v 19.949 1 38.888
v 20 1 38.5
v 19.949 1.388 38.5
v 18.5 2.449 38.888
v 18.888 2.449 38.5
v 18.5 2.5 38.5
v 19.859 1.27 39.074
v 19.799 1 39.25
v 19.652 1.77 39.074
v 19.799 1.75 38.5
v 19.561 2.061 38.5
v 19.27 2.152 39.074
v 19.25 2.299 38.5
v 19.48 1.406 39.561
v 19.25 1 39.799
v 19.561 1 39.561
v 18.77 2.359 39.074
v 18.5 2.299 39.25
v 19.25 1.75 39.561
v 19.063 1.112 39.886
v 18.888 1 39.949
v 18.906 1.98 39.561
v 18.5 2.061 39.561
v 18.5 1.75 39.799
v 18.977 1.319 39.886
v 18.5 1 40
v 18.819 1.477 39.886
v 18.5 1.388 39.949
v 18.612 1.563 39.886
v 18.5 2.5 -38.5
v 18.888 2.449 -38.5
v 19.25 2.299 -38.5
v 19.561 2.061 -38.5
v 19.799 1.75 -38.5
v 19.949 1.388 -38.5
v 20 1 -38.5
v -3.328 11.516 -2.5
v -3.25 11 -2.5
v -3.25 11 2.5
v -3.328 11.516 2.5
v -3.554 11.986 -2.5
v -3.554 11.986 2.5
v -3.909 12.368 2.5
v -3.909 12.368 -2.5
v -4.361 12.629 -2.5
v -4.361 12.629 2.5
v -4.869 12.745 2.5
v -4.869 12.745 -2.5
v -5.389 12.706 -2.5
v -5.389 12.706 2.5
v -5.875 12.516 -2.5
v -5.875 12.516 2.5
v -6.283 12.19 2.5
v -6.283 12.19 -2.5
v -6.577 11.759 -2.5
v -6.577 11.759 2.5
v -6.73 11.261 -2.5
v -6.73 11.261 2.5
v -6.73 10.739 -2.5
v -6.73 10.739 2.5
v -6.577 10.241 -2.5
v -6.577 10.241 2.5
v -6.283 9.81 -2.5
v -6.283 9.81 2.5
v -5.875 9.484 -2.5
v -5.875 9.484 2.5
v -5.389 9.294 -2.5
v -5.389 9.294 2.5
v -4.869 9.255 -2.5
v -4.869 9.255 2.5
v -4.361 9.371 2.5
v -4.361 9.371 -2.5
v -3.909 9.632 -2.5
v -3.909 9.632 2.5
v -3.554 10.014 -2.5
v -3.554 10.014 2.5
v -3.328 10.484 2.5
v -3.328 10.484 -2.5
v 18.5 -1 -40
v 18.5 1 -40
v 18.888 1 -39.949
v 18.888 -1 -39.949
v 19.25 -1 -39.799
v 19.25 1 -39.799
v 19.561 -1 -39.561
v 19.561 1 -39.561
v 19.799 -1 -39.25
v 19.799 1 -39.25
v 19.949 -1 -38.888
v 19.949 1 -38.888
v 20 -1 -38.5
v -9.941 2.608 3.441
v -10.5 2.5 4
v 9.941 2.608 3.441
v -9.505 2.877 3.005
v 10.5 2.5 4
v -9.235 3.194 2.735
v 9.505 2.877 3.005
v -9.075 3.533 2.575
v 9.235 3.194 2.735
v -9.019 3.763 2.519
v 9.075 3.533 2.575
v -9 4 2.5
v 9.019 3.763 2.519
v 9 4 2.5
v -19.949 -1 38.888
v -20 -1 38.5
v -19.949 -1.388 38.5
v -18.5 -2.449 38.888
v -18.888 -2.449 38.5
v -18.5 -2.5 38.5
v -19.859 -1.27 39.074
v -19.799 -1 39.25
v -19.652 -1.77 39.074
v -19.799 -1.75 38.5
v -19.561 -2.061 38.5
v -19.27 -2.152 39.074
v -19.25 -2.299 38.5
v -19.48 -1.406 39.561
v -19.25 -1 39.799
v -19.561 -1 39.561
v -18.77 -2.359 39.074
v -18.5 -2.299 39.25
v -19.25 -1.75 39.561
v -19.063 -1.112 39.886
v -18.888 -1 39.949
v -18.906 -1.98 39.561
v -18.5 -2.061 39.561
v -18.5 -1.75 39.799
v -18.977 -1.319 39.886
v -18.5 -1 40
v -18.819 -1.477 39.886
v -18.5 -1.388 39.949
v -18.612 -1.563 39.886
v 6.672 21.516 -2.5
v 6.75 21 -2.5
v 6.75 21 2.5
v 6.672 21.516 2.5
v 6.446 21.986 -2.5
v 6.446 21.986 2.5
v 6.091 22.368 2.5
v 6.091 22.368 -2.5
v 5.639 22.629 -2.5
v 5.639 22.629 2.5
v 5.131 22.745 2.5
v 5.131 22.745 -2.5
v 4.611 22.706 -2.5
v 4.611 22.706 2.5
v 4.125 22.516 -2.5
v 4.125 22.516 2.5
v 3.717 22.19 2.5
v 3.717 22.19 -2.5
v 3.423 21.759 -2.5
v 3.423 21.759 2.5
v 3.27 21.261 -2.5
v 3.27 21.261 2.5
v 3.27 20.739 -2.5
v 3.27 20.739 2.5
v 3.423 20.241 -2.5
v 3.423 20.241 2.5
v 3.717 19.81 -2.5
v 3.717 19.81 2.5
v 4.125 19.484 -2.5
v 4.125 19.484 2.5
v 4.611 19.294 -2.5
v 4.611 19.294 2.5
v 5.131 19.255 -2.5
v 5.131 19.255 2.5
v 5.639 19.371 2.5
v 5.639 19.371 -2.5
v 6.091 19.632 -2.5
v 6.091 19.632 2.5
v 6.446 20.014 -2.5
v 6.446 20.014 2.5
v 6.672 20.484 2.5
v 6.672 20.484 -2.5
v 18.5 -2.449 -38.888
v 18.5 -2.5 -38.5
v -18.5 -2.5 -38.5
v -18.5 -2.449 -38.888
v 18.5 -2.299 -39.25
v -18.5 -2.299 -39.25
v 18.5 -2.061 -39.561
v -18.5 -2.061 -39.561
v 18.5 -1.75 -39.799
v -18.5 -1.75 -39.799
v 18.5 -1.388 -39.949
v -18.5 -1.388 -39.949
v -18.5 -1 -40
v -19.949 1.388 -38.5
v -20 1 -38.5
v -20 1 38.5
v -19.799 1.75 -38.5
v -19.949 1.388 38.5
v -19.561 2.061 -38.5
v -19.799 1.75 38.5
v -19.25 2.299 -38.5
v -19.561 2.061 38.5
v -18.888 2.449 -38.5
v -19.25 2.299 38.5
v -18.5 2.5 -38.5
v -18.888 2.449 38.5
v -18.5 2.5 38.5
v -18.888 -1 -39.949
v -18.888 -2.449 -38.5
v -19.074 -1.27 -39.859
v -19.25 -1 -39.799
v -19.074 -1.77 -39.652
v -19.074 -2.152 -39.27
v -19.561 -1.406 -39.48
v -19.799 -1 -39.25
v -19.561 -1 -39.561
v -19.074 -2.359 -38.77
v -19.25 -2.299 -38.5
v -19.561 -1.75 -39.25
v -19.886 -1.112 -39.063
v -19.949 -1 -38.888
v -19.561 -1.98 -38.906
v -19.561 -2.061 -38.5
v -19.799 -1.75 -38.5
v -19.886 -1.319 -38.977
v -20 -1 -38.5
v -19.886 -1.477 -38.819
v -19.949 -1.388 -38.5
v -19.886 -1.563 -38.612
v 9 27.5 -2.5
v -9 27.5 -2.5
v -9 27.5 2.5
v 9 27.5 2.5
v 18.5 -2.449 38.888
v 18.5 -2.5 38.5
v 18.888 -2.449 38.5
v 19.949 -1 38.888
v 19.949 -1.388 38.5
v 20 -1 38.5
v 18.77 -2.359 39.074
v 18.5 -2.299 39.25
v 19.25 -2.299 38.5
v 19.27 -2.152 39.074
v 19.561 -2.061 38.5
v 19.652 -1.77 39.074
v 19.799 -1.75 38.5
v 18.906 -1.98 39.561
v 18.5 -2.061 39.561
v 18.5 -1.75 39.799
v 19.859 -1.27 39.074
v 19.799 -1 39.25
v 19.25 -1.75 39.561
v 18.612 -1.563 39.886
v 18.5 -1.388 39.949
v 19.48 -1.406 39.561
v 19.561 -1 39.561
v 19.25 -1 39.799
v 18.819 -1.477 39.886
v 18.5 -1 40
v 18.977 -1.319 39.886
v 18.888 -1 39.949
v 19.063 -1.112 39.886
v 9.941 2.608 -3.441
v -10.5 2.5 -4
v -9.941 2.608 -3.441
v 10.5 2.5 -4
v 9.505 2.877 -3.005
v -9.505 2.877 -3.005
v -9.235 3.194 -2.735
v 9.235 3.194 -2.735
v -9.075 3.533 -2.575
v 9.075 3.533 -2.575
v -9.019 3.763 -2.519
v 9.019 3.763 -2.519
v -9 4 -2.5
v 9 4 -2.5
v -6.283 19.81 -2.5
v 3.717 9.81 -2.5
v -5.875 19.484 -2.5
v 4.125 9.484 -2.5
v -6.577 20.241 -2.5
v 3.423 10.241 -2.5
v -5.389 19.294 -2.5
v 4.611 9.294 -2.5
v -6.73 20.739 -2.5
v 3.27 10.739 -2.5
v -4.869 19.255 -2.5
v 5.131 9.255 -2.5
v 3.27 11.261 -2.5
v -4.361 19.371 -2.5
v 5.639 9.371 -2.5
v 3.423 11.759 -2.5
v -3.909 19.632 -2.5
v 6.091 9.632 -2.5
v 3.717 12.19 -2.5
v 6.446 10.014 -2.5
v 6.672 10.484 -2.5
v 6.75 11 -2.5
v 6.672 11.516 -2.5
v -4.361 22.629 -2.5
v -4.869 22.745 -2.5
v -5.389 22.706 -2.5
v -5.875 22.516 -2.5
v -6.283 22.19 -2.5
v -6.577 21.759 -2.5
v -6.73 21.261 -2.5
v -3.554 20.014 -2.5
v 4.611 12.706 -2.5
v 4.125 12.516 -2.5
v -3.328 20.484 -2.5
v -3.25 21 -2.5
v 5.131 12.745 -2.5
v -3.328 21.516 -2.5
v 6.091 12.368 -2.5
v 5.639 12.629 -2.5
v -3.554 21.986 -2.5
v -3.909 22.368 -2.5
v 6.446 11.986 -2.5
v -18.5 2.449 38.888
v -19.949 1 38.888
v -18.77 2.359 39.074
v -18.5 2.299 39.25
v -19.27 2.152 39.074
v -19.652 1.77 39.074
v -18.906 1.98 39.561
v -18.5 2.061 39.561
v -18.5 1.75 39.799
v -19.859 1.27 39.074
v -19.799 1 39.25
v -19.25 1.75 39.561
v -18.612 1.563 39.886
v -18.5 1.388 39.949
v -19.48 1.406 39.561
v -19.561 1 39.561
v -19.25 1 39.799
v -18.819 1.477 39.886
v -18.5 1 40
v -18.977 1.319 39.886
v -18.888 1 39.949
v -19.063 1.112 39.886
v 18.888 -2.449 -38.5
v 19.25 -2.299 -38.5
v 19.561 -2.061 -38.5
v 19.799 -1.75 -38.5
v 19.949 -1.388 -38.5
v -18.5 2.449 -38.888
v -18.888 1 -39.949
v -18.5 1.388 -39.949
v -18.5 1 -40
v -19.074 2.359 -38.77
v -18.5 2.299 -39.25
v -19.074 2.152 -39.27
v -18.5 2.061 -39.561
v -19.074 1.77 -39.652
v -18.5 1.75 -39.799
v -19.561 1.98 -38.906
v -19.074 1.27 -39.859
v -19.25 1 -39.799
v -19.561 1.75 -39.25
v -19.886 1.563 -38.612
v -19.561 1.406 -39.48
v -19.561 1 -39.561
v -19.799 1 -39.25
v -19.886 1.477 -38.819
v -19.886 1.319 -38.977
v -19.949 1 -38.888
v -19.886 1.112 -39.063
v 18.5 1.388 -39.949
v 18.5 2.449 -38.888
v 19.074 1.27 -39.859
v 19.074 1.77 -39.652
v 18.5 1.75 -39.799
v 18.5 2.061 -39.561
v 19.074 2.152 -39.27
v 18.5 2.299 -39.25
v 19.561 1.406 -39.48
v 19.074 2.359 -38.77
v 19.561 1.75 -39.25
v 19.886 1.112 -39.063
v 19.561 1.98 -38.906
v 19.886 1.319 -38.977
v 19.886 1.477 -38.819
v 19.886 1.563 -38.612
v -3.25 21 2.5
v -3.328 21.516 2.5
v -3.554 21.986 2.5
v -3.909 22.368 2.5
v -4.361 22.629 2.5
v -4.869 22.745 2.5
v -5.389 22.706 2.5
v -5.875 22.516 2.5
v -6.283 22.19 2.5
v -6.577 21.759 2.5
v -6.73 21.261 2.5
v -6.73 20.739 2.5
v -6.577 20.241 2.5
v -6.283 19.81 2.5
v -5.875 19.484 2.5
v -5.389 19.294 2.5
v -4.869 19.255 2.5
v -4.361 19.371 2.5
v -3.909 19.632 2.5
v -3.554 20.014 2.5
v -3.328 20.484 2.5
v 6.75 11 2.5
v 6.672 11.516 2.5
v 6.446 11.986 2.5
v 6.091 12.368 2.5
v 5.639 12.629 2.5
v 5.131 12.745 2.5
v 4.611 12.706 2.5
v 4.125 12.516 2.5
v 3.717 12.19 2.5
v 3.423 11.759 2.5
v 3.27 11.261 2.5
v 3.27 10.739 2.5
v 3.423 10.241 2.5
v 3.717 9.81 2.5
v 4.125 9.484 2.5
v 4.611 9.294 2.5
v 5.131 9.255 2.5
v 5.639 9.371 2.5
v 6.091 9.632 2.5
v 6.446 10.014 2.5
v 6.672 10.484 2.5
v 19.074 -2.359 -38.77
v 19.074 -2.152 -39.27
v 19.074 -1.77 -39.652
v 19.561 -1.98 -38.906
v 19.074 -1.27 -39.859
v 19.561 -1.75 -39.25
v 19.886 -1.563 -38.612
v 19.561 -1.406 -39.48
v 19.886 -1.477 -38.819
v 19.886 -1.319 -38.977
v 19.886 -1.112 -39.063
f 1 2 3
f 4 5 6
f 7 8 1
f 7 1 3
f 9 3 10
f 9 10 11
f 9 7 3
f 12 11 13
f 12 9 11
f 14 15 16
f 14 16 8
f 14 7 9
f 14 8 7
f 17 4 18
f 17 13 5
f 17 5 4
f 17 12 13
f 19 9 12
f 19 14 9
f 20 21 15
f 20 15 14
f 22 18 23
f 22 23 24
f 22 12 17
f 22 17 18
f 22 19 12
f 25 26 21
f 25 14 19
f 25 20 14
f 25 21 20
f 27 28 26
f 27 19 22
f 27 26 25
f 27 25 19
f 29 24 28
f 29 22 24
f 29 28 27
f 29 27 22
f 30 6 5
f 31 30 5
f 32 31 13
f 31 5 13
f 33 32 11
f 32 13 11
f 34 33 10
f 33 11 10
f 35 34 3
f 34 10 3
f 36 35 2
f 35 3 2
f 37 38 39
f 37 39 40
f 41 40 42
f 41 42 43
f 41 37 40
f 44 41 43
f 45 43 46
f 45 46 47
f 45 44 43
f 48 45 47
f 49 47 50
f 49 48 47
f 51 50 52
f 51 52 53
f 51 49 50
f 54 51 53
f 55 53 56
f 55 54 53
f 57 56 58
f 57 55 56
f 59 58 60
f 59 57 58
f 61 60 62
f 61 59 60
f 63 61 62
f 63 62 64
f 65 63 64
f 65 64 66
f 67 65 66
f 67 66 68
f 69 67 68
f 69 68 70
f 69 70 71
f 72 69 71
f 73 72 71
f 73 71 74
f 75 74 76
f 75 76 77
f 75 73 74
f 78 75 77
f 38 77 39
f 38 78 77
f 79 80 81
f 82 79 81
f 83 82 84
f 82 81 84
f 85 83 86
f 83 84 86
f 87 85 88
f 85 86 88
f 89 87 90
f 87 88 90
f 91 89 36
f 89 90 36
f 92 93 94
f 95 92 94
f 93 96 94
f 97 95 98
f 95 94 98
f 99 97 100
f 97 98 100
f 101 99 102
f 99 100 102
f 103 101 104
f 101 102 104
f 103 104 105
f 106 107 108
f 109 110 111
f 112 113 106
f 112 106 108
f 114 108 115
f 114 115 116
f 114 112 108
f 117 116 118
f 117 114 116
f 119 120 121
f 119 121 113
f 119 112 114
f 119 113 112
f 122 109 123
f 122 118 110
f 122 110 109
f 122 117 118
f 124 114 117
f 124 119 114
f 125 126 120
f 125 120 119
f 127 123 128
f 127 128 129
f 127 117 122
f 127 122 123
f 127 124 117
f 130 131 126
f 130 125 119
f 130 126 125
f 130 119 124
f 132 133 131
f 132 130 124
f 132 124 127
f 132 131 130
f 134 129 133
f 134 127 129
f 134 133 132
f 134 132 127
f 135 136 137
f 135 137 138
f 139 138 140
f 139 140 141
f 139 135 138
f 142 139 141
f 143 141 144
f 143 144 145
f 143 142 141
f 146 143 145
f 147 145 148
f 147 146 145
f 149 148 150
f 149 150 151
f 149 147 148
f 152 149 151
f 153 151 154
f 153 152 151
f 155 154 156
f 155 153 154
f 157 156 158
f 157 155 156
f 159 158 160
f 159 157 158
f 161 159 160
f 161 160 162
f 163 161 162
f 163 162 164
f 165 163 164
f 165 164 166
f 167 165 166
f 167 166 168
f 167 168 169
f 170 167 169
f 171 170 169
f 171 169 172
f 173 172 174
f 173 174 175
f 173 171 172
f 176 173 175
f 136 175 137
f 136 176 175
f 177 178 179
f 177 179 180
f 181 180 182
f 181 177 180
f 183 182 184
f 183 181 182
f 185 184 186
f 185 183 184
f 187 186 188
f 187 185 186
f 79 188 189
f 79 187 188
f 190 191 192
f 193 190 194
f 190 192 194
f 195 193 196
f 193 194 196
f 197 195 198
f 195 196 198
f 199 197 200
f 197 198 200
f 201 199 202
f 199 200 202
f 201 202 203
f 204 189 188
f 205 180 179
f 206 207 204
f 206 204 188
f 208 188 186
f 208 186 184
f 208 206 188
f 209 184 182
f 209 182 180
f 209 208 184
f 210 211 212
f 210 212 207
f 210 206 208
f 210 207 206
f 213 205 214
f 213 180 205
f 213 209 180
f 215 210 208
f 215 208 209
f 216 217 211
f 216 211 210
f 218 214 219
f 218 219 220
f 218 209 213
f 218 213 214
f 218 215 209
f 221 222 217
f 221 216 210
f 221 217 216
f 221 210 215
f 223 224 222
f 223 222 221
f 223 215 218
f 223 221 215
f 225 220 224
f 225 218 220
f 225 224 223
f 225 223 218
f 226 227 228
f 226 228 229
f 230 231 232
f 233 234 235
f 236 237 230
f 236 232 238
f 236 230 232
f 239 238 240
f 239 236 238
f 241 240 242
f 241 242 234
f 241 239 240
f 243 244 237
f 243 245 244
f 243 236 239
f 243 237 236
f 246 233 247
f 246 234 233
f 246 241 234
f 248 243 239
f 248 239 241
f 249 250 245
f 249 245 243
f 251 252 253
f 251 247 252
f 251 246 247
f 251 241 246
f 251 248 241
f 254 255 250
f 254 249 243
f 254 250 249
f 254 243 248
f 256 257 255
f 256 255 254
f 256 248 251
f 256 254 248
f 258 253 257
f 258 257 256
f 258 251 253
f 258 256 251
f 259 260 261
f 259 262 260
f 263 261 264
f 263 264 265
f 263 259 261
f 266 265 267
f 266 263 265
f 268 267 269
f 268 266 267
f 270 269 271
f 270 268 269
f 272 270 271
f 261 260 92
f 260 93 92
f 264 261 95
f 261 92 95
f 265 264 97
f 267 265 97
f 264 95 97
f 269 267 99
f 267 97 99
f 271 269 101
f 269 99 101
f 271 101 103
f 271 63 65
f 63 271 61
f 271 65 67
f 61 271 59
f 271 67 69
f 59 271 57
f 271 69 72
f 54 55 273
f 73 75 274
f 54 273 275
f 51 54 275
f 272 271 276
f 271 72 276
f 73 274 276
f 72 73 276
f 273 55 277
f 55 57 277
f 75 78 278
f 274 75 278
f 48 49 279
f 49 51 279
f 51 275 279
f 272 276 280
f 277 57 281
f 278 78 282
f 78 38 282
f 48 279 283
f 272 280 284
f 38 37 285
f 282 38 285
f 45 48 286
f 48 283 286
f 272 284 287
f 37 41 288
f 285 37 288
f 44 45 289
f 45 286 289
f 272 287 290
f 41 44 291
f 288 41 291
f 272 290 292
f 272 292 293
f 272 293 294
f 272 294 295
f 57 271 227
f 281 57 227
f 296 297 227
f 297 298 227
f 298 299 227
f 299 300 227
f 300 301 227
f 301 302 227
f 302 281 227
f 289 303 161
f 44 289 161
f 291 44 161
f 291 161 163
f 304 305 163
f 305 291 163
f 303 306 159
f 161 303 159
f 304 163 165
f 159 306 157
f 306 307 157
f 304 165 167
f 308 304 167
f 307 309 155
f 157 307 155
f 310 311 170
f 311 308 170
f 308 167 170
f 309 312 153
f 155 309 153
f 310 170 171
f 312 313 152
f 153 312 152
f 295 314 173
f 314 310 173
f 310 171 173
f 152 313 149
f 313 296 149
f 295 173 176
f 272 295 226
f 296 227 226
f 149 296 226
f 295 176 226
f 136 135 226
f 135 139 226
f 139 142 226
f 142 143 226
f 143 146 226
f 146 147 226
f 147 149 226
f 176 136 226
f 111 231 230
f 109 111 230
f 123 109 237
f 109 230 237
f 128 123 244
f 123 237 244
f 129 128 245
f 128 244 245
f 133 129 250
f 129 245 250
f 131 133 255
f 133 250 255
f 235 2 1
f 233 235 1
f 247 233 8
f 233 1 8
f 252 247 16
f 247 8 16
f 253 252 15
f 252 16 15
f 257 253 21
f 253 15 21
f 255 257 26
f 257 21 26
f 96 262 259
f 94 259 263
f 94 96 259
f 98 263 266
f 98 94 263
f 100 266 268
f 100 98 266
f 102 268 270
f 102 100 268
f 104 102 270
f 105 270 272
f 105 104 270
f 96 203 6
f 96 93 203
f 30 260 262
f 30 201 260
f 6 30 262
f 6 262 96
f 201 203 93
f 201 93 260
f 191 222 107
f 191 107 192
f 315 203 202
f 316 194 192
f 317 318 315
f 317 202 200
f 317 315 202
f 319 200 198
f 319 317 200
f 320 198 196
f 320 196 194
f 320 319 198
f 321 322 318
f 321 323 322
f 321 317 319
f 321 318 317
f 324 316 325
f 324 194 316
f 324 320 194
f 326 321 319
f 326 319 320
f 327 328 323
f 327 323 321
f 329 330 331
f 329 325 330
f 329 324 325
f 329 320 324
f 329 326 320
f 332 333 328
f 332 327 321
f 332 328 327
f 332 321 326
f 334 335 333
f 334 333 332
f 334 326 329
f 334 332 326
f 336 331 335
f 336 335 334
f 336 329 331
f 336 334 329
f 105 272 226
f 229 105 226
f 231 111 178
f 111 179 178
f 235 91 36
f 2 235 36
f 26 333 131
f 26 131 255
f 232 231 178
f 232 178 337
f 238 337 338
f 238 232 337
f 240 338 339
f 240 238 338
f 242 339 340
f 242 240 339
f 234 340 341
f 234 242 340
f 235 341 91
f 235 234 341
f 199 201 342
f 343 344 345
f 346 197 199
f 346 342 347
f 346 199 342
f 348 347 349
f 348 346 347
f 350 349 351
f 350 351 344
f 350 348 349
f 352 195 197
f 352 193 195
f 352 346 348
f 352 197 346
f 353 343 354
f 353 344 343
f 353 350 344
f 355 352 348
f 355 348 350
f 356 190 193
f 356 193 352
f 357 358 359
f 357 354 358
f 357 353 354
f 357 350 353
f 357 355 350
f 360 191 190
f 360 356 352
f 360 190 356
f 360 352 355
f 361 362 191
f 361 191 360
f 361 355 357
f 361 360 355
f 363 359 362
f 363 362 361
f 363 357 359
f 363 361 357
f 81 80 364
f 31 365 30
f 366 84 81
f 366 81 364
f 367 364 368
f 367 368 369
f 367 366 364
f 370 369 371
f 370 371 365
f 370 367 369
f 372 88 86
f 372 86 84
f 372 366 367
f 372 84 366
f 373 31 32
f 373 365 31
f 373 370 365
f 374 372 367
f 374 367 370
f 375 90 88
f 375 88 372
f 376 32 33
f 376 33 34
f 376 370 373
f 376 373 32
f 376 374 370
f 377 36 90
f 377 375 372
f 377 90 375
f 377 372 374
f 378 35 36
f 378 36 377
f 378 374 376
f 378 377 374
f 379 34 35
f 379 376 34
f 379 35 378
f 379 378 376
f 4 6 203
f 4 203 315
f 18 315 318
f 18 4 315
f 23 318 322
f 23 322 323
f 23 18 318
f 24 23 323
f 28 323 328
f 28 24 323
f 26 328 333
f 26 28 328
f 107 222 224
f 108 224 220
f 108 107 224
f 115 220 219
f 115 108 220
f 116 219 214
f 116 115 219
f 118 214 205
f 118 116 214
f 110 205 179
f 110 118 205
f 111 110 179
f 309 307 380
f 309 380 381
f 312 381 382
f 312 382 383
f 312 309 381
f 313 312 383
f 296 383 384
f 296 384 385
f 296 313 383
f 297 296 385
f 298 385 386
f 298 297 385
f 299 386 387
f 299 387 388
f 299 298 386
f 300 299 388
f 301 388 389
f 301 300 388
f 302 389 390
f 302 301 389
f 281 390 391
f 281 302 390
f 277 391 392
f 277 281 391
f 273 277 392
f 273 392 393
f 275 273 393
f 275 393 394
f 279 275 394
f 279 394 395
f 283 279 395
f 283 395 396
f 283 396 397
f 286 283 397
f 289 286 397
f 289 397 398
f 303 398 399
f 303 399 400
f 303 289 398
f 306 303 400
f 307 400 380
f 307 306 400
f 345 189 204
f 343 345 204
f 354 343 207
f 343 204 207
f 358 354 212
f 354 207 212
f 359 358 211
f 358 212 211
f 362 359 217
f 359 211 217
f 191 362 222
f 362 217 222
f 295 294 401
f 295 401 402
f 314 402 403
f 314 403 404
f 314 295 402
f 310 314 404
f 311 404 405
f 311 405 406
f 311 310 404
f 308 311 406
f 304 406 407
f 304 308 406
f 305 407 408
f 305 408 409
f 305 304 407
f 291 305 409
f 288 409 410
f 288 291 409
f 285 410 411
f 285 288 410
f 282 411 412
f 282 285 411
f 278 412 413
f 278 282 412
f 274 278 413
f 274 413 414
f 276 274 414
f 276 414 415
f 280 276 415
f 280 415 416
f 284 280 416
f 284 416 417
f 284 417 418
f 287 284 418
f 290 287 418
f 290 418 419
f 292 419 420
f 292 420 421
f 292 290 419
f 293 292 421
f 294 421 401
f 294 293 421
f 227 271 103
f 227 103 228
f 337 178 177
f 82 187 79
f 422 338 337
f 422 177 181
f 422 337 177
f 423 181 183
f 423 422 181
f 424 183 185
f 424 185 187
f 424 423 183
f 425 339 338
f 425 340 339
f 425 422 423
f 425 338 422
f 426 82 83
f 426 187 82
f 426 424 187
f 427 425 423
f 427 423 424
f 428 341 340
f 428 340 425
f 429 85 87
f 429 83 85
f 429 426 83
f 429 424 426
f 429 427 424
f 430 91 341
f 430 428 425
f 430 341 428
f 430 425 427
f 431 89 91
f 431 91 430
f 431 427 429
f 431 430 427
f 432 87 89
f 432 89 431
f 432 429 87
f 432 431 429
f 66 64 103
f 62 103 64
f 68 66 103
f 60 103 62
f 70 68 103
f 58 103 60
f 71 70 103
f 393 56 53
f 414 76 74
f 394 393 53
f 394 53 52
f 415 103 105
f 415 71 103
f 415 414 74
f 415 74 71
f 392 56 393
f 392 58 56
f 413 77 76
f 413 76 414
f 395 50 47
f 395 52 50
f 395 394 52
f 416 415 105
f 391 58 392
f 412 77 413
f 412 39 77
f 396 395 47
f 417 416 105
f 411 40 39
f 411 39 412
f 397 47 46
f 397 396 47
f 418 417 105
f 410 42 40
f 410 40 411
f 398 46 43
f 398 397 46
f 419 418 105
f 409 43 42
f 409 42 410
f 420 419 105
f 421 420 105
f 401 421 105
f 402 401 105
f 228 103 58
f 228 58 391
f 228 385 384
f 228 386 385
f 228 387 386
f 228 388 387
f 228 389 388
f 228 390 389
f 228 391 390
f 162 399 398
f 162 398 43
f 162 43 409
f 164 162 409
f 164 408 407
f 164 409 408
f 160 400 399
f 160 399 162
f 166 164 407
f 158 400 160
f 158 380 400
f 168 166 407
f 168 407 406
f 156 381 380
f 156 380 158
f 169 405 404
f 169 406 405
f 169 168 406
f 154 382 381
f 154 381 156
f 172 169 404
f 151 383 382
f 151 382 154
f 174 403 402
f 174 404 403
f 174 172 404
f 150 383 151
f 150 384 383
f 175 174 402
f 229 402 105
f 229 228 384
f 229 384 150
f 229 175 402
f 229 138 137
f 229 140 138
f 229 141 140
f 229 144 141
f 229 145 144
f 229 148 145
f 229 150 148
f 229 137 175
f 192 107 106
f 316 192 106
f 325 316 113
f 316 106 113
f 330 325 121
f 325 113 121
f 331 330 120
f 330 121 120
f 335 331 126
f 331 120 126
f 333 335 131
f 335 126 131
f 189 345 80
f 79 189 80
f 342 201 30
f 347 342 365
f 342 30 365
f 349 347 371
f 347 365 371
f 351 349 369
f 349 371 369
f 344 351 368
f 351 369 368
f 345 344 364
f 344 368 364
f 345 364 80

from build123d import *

# Parameters (mm, degrees)
BOSS_EXTRUDE1_DEPTH      = 40
BOSS_EXTRUDE1_DEPTH_BACK = 40
SKETCH1_W                = 40
SKETCH1_H                = 5
BOSS_EXTRUDE2_DEPTH      = 2.5
BOSS_EXTRUDE2_DEPTH_BACK = 2.5
SKETCH2_W                = 18
SKETCH2_H                = 25
SKETCH2_R                = 1.75
FILLET1_R                = 1.5
FILLET2_R                = 1.5
FILLET3_R                = 1.5


with BuildPart() as part:
    # Sketch1 → Boss-Extrude1 (new, two sides: drawn at the far end of the back side and taken through both)
    with BuildSketch(Plane.XY.offset(-BOSS_EXTRUDE1_DEPTH_BACK)):
        Rectangle(SKETCH1_W, SKETCH1_H)
    extrude(amount=BOSS_EXTRUDE1_DEPTH + BOSS_EXTRUDE1_DEPTH_BACK)

    # Sketch2 → Boss-Extrude2 (add, two sides: drawn at the far end of the back side and taken through both)
    with BuildSketch(Plane.XY.offset(-BOSS_EXTRUDE2_DEPTH_BACK)):
        with Locations((0, 15)):
            Rectangle(SKETCH2_W, SKETCH2_H)
        with Locations((-5, 11)):
            Circle(SKETCH2_R, mode=Mode.SUBTRACT)
        with Locations((5, 11)):
            Circle(SKETCH2_R, mode=Mode.SUBTRACT)
        with Locations((5, 21)):
            Circle(SKETCH2_R, mode=Mode.SUBTRACT)
        with Locations((-5, 21)):
            Circle(SKETCH2_R, mode=Mode.SUBTRACT)
    extrude(amount=BOSS_EXTRUDE2_DEPTH + BOSS_EXTRUDE2_DEPTH_BACK)

    # Fillet1
    fillet1_edges = [part.edges().sort_by_distance(p)[0] for p in [
        (0, 2.5, 40),
        (0, -2.5, 40),
        (0, -2.5, -40),
        (9, 2.5, 0),
        (0, 2.5, -2.5),
        (-9, 2.5, 0),
        (0, 2.5, 2.5),
        (20, -2.5, 0),
        (-20, -2.5, 0),
        (-20, 2.5, 0),
        (20, 2.5, 0),
        (0, 2.5, -40),
    ]]
    fillet(fillet1_edges, radius=FILLET1_R)

    # Fillet2
    # the kernel refuses this fillet: 1.5 mm, written as the material it takes off along each edge
    with BuildSketch(Plane(origin=(18.5, 1, 38.5), x_dir=(1, 0, 0), z_dir=(0, 0, 1))) as fillet2_piece_1_section:
        Polygon((0, 0), (FILLET2_R, 0), (FILLET2_R, FILLET2_R), (0, FILLET2_R), align=None)
    fillet2_piece_1 = extrude(amount=FILLET2_R, mode=Mode.PRIVATE)
    fillet2_piece_1 = fillet2_piece_1 - Plane(origin=(18.5, 1, 38.5), x_dir=(-0.7071067811865475, -0.7071067811865475, 0), z_dir=(0, 0, 1)) * Sphere(FILLET2_R, mode=Mode.PRIVATE)
    add(fillet2_piece_1, mode=Mode.SUBTRACT)
    with BuildSketch(Plane(origin=(-18.5, 1, 38.5), x_dir=(-1, 0, 0), z_dir=(0, 0, 1))) as fillet2_piece_2_section:
        Polygon((0, 0), (FILLET2_R, 0), (FILLET2_R, -FILLET2_R), (0, -FILLET2_R), align=None)
    fillet2_piece_2 = extrude(amount=FILLET2_R, mode=Mode.PRIVATE)
    fillet2_piece_2 = fillet2_piece_2 - Plane(origin=(-18.5, 1, 38.5), x_dir=(0.7071067811865475, -0.7071067811865475, 0), z_dir=(0, 0, 1)) * Sphere(FILLET2_R, mode=Mode.PRIVATE)
    add(fillet2_piece_2, mode=Mode.SUBTRACT)
    with BuildSketch(Plane(origin=(-18.5, -1, 38.5), x_dir=(-1, 0, 0), z_dir=(0, 0, 1))) as fillet2_piece_3_section:
        Polygon((0, 0), (FILLET2_R, 0), (FILLET2_R, FILLET2_R), (0, FILLET2_R), align=None)
    fillet2_piece_3 = extrude(amount=FILLET2_R, mode=Mode.PRIVATE)
    fillet2_piece_3 = fillet2_piece_3 - Plane(origin=(-18.5, -1, 38.5), x_dir=(0.7071067811865475, 0.7071067811865475, 0), z_dir=(0, 0, 1)) * Sphere(FILLET2_R, mode=Mode.PRIVATE)
    add(fillet2_piece_3, mode=Mode.SUBTRACT)
    with BuildSketch(Plane(origin=(18.5, -1, 38.5), x_dir=(1, 0, 0), z_dir=(0, 0, 1))) as fillet2_piece_4_section:
        Polygon((0, 0), (FILLET2_R, 0), (FILLET2_R, -FILLET2_R), (0, -FILLET2_R), align=None)
    fillet2_piece_4 = extrude(amount=FILLET2_R, mode=Mode.PRIVATE)
    fillet2_piece_4 = fillet2_piece_4 - Plane(origin=(18.5, -1, 38.5), x_dir=(-0.7071067811865475, 0.7071067811865475, 0), z_dir=(0, 0, 1)) * Sphere(FILLET2_R, mode=Mode.PRIVATE)
    add(fillet2_piece_4, mode=Mode.SUBTRACT)
    with BuildSketch(Plane(origin=(20, 1, 40), x_dir=(-1, 0, 0), z_dir=(0, -1, 0)), Plane(origin=(-20, -1, 40), x_dir=(1, 0, 0), z_dir=(0, 1, 0))) as fillet2_piece_5:
        with BuildLine():
            CenterArc((FILLET2_R, FILLET2_R), FILLET2_R, 180, 90)
            Line((0, FILLET2_R), (0, 0))
            Line((0, 0), (FILLET2_R, 0))
        make_face()
    extrude(amount=2, mode=Mode.SUBTRACT)

    # Fillet3
    # the kernel refuses this fillet: 1.5 mm, written as the material it takes off along each edge
    with BuildSketch(Plane(origin=(18.5, 1, -38.5), x_dir=(0, 0, -1), z_dir=(1, 0, 0))) as fillet3_piece_1_section:
        Polygon((0, 0), (FILLET3_R, 0), (FILLET3_R, FILLET3_R), (0, FILLET3_R), align=None)
    fillet3_piece_1 = extrude(amount=FILLET3_R, mode=Mode.PRIVATE)
    fillet3_piece_1 = fillet3_piece_1 - Plane(origin=(18.5, 1, -38.5), x_dir=(0, -0.7071067811865475, 0.7071067811865475), z_dir=(1, 0, 0)) * Sphere(FILLET3_R, mode=Mode.PRIVATE)
    add(fillet3_piece_1, mode=Mode.SUBTRACT)
    with BuildSketch(Plane(origin=(-18.5, 1, -38.5), x_dir=(0, 0, -1), z_dir=(-1, 0, 0))) as fillet3_piece_2_section:
        Polygon((0, 0), (FILLET3_R, 0), (FILLET3_R, -FILLET3_R), (0, -FILLET3_R), align=None)
    fillet3_piece_2 = extrude(amount=FILLET3_R, mode=Mode.PRIVATE)
    fillet3_piece_2 = fillet3_piece_2 - Plane(origin=(-18.5, 1, -38.5), x_dir=(0, -0.7071067811865475, 0.7071067811865475), z_dir=(-1, 0, 0)) * Sphere(FILLET3_R, mode=Mode.PRIVATE)
    add(fillet3_piece_2, mode=Mode.SUBTRACT)
    with BuildSketch(Plane(origin=(-18.5, -1, -38.5), x_dir=(0, 0, -1), z_dir=(-1, 0, 0))) as fillet3_piece_3_section:
        Polygon((0, 0), (FILLET3_R, 0), (FILLET3_R, FILLET3_R), (0, FILLET3_R), align=None)
    fillet3_piece_3 = extrude(amount=FILLET3_R, mode=Mode.PRIVATE)
    fillet3_piece_3 = fillet3_piece_3 - Plane(origin=(-18.5, -1, -38.5), x_dir=(0, 0.7071067811865475, 0.7071067811865475), z_dir=(-1, 0, 0)) * Sphere(FILLET3_R, mode=Mode.PRIVATE)
    add(fillet3_piece_3, mode=Mode.SUBTRACT)
    with BuildSketch(Plane(origin=(18.5, -1, -38.5), x_dir=(0, 0, -1), z_dir=(1, 0, 0))) as fillet3_piece_4_section:
        Polygon((0, 0), (FILLET3_R, 0), (FILLET3_R, -FILLET3_R), (0, -FILLET3_R), align=None)
    fillet3_piece_4 = extrude(amount=FILLET3_R, mode=Mode.PRIVATE)
    fillet3_piece_4 = fillet3_piece_4 - Plane(origin=(18.5, -1, -38.5), x_dir=(0, 0.7071067811865475, 0.7071067811865475), z_dir=(1, 0, 0)) * Sphere(FILLET3_R, mode=Mode.PRIVATE)
    add(fillet3_piece_4, mode=Mode.SUBTRACT)
    with BuildSketch(Plane(origin=(20, 1, -40), x_dir=(0, 0, 1), z_dir=(0, -1, 0)), Plane(origin=(-20, -1, -40), x_dir=(0, 0, 1), z_dir=(0, 1, 0))) as fillet3_piece_5:
        with BuildLine():
            CenterArc((FILLET3_R, FILLET3_R), FILLET3_R, 180, 90)
            Line((0, FILLET3_R), (0, 0))
            Line((0, 0), (FILLET3_R, 0))
        make_face()
    extrude(amount=2, mode=Mode.SUBTRACT)


solid = part.part
